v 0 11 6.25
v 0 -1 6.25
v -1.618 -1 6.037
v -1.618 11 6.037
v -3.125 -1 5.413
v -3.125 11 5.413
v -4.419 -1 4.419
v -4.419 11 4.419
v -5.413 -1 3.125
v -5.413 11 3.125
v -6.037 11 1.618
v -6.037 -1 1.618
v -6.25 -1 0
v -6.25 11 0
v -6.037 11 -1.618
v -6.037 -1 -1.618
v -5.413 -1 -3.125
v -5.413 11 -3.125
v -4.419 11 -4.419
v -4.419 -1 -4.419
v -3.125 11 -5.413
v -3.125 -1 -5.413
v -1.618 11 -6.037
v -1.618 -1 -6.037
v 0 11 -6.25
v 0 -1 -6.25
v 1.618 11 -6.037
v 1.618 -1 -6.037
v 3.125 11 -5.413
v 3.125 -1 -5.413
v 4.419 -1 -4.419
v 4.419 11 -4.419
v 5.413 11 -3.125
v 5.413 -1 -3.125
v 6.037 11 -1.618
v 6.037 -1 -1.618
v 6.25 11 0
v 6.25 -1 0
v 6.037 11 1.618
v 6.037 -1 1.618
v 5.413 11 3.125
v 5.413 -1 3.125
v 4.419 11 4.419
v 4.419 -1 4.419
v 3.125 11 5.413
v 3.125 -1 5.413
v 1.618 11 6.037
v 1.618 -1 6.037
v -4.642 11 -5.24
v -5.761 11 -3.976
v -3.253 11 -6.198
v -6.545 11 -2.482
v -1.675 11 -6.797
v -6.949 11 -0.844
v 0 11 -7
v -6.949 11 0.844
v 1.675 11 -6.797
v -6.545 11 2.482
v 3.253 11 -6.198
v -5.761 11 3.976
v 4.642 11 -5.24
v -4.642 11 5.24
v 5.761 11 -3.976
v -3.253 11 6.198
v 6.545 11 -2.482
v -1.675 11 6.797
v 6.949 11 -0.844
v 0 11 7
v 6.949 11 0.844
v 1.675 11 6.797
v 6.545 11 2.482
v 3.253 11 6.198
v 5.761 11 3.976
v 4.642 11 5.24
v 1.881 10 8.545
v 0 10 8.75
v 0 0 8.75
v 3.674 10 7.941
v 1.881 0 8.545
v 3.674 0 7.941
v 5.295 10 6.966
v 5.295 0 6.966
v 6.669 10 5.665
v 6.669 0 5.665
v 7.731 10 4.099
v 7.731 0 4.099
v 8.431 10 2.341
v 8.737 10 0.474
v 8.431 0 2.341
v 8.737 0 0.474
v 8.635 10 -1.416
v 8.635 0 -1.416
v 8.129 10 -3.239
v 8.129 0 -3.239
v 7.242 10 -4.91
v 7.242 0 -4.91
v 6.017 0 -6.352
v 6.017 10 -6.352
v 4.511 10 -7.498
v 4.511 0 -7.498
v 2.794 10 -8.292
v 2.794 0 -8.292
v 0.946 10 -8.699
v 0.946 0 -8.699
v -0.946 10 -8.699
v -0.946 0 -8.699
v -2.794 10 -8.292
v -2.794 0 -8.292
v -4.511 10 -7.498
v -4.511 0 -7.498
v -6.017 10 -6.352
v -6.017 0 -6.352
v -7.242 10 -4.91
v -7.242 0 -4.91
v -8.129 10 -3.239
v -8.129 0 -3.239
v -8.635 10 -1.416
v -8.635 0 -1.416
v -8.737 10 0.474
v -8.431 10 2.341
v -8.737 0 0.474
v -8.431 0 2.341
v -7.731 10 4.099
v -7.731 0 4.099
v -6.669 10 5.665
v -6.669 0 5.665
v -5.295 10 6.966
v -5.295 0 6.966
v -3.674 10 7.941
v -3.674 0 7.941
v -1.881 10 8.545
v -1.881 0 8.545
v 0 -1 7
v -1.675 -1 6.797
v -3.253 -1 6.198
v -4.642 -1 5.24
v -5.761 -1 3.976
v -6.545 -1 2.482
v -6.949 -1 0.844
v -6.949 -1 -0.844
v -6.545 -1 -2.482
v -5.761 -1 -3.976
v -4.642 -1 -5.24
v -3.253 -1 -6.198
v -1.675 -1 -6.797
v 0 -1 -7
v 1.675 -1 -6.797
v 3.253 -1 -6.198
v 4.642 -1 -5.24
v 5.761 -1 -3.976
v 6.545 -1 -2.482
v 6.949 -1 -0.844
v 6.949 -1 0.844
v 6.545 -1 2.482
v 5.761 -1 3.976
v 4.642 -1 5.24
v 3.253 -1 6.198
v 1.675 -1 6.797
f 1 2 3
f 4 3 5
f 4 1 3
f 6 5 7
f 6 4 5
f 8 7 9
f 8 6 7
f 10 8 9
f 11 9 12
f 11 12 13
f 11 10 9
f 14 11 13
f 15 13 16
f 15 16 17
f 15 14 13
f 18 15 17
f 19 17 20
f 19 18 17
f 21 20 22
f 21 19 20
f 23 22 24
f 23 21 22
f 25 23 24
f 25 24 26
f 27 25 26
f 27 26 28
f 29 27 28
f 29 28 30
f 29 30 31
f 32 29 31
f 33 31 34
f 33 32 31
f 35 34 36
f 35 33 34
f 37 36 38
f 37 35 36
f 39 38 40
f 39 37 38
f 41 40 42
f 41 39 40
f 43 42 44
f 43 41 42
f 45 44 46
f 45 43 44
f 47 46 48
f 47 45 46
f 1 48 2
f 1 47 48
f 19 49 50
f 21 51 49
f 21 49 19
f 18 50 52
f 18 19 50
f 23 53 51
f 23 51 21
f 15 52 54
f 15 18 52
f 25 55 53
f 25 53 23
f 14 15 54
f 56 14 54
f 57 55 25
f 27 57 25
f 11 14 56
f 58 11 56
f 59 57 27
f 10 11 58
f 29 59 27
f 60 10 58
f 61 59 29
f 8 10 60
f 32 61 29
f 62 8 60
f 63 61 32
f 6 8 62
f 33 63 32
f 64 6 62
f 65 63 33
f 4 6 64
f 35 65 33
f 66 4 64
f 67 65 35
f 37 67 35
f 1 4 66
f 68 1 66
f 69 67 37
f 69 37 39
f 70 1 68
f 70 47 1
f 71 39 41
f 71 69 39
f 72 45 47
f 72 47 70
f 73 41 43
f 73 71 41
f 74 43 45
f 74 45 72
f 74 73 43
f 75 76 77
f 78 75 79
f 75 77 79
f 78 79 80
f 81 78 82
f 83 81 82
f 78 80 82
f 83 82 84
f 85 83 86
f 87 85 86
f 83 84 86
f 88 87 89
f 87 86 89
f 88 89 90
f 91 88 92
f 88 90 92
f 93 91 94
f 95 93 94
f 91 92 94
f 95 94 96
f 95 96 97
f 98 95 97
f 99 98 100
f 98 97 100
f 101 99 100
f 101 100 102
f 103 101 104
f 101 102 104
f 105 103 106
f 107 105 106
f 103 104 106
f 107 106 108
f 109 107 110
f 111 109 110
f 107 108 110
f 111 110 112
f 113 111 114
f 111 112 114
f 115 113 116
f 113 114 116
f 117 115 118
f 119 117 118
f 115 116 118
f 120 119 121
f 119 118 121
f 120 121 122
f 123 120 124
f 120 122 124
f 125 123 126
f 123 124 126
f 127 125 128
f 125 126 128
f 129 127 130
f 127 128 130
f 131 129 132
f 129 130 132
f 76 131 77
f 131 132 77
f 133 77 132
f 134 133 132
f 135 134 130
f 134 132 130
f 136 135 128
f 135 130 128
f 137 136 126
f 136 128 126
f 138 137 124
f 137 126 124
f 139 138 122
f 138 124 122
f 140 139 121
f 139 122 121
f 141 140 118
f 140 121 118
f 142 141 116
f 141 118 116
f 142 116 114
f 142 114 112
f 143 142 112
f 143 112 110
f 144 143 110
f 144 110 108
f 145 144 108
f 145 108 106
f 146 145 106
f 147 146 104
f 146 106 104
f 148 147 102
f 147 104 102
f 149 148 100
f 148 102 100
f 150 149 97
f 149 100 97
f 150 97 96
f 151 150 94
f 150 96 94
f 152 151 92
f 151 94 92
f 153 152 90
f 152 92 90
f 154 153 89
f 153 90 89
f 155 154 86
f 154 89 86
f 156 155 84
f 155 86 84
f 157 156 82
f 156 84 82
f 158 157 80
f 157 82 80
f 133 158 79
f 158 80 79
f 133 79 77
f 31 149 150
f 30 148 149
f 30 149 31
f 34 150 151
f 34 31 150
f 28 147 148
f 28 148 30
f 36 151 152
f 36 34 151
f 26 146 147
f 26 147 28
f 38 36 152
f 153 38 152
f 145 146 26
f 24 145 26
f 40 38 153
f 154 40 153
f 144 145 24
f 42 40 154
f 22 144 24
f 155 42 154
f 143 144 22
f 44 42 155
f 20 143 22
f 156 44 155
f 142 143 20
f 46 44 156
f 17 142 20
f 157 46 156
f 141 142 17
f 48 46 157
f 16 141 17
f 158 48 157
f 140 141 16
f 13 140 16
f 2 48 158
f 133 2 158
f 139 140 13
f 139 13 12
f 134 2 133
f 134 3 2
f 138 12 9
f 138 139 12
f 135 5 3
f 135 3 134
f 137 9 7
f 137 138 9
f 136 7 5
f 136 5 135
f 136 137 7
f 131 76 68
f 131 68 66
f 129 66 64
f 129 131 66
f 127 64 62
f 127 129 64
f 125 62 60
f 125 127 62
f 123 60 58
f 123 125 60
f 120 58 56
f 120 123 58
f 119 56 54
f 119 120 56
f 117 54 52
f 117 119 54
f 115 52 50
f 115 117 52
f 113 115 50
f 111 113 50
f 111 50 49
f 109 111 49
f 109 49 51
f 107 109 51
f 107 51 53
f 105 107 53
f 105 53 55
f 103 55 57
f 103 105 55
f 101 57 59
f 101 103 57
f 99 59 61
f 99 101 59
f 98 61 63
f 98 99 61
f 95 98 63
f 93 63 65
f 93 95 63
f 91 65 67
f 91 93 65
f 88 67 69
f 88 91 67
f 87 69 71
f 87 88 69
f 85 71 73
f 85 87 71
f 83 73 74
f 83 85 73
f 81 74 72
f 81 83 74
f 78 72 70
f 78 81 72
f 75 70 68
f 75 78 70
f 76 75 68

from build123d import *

# Parameters (mm, degrees)
SKETCH_1_R          = 8.75
EXTRUDE_1_DEPTH     = 10
CUT_EXTRUDE_1_REACH = 17.91
SKETCH_2_R          = 6.25
EXTRUDE_START       = 1
SKETCH_3_R          = 7
SKETCH_3_R_2        = 6.25
EXTRUDE_2_DEPTH     = 1
SKETCH_4_R          = 7
SKETCH_4_R_2        = 6.25
EXTRUDE_3_DEPTH     = 1


with BuildPart() as part:
    # 草图1 → 凸台-拉伸1 (new body)
    with BuildSketch(Plane(origin=(0, 0, 0), x_dir=(1, 0, 0), z_dir=(0, 1, 0))):
        with Locations(Location((0, 0, 0), (0, 0, 270))):
            Circle(SKETCH_1_R)
    extrude(amount=EXTRUDE_1_DEPTH)

    # 草图2 → 切除-拉伸1 (cut, up to next)
    with BuildSketch(Plane(origin=(0, 10, 0), x_dir=(1, 0, 0), z_dir=(0, 1, 0)), mode=Mode.PRIVATE) as cut_extrude_1_sk1:
        with Locations(Location((0, 0, 0), (0, 0, 270))):
            Circle(SKETCH_2_R)
    cut_extrude_1_tool1 = extrude(cut_extrude_1_sk1.sketch, amount=-CUT_EXTRUDE_1_REACH, mode=Mode.PRIVATE) & part.part
    add(cut_extrude_1_tool1.solids().sort_by_distance((0, 10, 0))[0], mode=Mode.SUBTRACT)

    # 草图3 → 凸台-拉伸2 (add)
    with BuildSketch(Plane(origin=(0, 10, 0), x_dir=(1, 0, 0), z_dir=(0, 1, 0)).offset(EXTRUDE_START)):
        with Locations(Location((0, 0, 0), (0, 0, 270))):
            Circle(SKETCH_3_R)
        with Locations(Location((0, 0, 0), (0, 0, 270))):
            Circle(SKETCH_3_R_2, mode=Mode.SUBTRACT)
    extrude(amount=-EXTRUDE_2_DEPTH)

    # 草图4 → 凸台-拉伸3 (add)
    with BuildSketch(Plane.XZ):
        with Locations(Location((0, 0, 0), (0, 0, 90))):
            Circle(SKETCH_4_R)
        with Locations(Location((0, 0, 0), (0, 0, 90))):
            Circle(SKETCH_4_R_2, mode=Mode.SUBTRACT)
    extrude(amount=EXTRUDE_3_DEPTH)

    # 草图5 → 旋转1 (revolve)
    with BuildSketch(Plane.XY, mode=Mode.PRIVATE) as revolve_1_sk:
        Polygon((-7, 11), (-8.75, 10), (-7, 10), align=None)
        Polygon((-8.75, 0), (-7, 0), (-7, -1), align=None)
    revolve(revolve_1_sk.sketch.rotate(Axis((0, 12.096395085, 0), (0, -1, 0)), 270), axis=Axis((0, 12.096395085, 0), (0, -1, 0)))


solid = part.part
